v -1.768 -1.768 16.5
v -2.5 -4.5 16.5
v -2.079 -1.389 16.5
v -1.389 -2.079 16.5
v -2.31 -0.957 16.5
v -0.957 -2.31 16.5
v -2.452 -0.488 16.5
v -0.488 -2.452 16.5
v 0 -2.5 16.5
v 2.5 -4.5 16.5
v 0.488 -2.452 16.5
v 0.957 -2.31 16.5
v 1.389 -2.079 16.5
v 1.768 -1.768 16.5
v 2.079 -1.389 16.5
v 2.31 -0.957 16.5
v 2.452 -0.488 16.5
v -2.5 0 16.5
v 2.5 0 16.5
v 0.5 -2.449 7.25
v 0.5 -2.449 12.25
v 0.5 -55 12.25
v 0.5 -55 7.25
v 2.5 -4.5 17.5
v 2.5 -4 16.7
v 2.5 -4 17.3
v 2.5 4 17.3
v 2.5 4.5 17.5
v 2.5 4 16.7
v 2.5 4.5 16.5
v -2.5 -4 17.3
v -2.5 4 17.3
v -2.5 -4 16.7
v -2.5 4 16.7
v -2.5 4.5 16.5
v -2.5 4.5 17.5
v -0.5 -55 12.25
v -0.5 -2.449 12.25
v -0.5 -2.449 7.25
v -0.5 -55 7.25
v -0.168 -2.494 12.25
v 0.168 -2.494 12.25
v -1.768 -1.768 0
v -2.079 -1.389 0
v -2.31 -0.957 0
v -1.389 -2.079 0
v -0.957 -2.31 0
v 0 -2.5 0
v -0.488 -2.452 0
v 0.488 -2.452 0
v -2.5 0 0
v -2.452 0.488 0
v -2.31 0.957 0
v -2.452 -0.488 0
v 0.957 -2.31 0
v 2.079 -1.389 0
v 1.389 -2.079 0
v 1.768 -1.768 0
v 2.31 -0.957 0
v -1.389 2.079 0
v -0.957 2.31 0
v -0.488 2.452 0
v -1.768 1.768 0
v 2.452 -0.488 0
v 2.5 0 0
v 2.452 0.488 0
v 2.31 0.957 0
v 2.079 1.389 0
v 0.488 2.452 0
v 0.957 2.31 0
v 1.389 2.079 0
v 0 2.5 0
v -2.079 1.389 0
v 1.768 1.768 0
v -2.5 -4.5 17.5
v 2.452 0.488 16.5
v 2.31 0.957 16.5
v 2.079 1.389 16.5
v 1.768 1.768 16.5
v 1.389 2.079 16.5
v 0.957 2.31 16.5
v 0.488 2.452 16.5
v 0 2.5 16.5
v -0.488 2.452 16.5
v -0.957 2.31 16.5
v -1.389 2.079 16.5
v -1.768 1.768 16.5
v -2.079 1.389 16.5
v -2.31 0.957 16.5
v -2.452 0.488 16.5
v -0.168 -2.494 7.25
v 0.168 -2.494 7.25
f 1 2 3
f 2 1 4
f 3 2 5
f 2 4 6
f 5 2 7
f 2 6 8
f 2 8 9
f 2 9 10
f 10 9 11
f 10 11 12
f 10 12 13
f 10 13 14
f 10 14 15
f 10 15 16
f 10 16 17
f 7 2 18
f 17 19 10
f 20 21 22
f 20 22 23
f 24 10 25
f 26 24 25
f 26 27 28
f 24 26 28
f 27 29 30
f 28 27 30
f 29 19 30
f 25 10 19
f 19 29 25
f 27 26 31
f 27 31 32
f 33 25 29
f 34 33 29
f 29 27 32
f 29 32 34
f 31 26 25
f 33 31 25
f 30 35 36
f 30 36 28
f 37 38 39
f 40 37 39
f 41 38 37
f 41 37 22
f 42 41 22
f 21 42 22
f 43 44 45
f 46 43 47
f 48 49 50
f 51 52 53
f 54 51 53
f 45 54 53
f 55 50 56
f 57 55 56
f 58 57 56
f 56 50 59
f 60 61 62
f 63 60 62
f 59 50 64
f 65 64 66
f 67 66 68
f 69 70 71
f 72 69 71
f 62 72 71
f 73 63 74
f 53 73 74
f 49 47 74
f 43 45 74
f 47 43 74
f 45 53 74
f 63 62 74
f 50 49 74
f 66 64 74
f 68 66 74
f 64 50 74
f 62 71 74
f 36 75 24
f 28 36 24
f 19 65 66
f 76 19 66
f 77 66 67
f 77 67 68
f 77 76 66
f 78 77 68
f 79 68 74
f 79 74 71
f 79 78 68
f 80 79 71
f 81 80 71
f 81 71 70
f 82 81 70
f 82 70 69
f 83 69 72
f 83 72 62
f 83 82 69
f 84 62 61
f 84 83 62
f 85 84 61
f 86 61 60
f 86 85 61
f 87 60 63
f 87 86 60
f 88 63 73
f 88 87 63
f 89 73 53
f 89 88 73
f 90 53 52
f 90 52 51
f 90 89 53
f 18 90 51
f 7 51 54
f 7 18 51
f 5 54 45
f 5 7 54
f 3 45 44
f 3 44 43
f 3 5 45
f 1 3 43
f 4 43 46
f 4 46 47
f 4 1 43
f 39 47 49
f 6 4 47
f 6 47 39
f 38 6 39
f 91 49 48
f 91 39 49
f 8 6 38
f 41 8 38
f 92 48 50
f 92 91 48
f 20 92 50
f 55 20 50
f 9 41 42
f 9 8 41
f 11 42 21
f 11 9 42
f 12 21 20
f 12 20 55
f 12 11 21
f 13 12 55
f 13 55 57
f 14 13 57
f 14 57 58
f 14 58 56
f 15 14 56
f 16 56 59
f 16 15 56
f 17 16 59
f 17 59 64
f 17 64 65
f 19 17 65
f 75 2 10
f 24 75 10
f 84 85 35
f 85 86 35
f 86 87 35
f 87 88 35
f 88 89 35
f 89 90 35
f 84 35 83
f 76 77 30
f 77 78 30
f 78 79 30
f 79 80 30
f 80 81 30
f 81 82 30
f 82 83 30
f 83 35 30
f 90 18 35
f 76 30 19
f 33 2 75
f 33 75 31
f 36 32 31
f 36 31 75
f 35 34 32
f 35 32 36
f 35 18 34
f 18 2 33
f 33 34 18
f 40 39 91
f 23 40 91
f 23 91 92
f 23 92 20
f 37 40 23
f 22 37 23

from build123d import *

# Parameters (mm, degrees)
SKETCH2_R               = 2.5
SKETCH3_R               = 2.5
SKETCH4_W               = 1
SKETCH4_H               = 5
BOSS_EXTRUDE1_DEPTH     = 55
SKETCH3_7_W             = 5
SKETCH3_7_H             = 9
BOSS_EXTRUDE4_DEPTH     = 1
CUT_EXTRUDE2_DEPTH      = 58.93315114
CUT_EXTRUDE2_DEPTH_BACK = 58.93315114
SKETCH8_W               = 0.6
SKETCH8_H               = 8


with BuildPart() as part:
    # Sketch2 → Loft1 section 0
    with BuildSketch(Plane.XY):
        Circle(SKETCH2_R)
    # Sketch3 → Loft1 section 1
    with BuildSketch(Plane.XY.offset(16.5)):
        Circle(SKETCH3_R)
    loft()

    # Sketch4 → Boss-Extrude1 (add)
    with BuildSketch(Plane(origin=(0, 0, 0), x_dir=(1, 0, 0), z_dir=(0, 1, 0))):
        with Locations((0, -9.75)):
            Rectangle(SKETCH4_W, SKETCH4_H)
    extrude(amount=-BOSS_EXTRUDE1_DEPTH)

    # Sketch3<7> → Boss-Extrude4 (add)
    with BuildSketch(Plane.XY.offset(16.5)):
        Rectangle(SKETCH3_7_W, SKETCH3_7_H)
    extrude(amount=BOSS_EXTRUDE4_DEPTH)

    # Sketch8 → Cut-Extrude2 (cut, two sides: drawn at the far end of the back side and taken through both)
    with BuildSketch(Plane(origin=(2.5, 0, 0), x_dir=(0, 0, -1), z_dir=(1, 0, 0)).offset(-CUT_EXTRUDE2_DEPTH_BACK)):
        with Locations((-17, 0)):
            Rectangle(SKETCH8_W, SKETCH8_H)
    extrude(amount=CUT_EXTRUDE2_DEPTH + CUT_EXTRUDE2_DEPTH_BACK, mode=Mode.SUBTRACT)


solid = part.part
